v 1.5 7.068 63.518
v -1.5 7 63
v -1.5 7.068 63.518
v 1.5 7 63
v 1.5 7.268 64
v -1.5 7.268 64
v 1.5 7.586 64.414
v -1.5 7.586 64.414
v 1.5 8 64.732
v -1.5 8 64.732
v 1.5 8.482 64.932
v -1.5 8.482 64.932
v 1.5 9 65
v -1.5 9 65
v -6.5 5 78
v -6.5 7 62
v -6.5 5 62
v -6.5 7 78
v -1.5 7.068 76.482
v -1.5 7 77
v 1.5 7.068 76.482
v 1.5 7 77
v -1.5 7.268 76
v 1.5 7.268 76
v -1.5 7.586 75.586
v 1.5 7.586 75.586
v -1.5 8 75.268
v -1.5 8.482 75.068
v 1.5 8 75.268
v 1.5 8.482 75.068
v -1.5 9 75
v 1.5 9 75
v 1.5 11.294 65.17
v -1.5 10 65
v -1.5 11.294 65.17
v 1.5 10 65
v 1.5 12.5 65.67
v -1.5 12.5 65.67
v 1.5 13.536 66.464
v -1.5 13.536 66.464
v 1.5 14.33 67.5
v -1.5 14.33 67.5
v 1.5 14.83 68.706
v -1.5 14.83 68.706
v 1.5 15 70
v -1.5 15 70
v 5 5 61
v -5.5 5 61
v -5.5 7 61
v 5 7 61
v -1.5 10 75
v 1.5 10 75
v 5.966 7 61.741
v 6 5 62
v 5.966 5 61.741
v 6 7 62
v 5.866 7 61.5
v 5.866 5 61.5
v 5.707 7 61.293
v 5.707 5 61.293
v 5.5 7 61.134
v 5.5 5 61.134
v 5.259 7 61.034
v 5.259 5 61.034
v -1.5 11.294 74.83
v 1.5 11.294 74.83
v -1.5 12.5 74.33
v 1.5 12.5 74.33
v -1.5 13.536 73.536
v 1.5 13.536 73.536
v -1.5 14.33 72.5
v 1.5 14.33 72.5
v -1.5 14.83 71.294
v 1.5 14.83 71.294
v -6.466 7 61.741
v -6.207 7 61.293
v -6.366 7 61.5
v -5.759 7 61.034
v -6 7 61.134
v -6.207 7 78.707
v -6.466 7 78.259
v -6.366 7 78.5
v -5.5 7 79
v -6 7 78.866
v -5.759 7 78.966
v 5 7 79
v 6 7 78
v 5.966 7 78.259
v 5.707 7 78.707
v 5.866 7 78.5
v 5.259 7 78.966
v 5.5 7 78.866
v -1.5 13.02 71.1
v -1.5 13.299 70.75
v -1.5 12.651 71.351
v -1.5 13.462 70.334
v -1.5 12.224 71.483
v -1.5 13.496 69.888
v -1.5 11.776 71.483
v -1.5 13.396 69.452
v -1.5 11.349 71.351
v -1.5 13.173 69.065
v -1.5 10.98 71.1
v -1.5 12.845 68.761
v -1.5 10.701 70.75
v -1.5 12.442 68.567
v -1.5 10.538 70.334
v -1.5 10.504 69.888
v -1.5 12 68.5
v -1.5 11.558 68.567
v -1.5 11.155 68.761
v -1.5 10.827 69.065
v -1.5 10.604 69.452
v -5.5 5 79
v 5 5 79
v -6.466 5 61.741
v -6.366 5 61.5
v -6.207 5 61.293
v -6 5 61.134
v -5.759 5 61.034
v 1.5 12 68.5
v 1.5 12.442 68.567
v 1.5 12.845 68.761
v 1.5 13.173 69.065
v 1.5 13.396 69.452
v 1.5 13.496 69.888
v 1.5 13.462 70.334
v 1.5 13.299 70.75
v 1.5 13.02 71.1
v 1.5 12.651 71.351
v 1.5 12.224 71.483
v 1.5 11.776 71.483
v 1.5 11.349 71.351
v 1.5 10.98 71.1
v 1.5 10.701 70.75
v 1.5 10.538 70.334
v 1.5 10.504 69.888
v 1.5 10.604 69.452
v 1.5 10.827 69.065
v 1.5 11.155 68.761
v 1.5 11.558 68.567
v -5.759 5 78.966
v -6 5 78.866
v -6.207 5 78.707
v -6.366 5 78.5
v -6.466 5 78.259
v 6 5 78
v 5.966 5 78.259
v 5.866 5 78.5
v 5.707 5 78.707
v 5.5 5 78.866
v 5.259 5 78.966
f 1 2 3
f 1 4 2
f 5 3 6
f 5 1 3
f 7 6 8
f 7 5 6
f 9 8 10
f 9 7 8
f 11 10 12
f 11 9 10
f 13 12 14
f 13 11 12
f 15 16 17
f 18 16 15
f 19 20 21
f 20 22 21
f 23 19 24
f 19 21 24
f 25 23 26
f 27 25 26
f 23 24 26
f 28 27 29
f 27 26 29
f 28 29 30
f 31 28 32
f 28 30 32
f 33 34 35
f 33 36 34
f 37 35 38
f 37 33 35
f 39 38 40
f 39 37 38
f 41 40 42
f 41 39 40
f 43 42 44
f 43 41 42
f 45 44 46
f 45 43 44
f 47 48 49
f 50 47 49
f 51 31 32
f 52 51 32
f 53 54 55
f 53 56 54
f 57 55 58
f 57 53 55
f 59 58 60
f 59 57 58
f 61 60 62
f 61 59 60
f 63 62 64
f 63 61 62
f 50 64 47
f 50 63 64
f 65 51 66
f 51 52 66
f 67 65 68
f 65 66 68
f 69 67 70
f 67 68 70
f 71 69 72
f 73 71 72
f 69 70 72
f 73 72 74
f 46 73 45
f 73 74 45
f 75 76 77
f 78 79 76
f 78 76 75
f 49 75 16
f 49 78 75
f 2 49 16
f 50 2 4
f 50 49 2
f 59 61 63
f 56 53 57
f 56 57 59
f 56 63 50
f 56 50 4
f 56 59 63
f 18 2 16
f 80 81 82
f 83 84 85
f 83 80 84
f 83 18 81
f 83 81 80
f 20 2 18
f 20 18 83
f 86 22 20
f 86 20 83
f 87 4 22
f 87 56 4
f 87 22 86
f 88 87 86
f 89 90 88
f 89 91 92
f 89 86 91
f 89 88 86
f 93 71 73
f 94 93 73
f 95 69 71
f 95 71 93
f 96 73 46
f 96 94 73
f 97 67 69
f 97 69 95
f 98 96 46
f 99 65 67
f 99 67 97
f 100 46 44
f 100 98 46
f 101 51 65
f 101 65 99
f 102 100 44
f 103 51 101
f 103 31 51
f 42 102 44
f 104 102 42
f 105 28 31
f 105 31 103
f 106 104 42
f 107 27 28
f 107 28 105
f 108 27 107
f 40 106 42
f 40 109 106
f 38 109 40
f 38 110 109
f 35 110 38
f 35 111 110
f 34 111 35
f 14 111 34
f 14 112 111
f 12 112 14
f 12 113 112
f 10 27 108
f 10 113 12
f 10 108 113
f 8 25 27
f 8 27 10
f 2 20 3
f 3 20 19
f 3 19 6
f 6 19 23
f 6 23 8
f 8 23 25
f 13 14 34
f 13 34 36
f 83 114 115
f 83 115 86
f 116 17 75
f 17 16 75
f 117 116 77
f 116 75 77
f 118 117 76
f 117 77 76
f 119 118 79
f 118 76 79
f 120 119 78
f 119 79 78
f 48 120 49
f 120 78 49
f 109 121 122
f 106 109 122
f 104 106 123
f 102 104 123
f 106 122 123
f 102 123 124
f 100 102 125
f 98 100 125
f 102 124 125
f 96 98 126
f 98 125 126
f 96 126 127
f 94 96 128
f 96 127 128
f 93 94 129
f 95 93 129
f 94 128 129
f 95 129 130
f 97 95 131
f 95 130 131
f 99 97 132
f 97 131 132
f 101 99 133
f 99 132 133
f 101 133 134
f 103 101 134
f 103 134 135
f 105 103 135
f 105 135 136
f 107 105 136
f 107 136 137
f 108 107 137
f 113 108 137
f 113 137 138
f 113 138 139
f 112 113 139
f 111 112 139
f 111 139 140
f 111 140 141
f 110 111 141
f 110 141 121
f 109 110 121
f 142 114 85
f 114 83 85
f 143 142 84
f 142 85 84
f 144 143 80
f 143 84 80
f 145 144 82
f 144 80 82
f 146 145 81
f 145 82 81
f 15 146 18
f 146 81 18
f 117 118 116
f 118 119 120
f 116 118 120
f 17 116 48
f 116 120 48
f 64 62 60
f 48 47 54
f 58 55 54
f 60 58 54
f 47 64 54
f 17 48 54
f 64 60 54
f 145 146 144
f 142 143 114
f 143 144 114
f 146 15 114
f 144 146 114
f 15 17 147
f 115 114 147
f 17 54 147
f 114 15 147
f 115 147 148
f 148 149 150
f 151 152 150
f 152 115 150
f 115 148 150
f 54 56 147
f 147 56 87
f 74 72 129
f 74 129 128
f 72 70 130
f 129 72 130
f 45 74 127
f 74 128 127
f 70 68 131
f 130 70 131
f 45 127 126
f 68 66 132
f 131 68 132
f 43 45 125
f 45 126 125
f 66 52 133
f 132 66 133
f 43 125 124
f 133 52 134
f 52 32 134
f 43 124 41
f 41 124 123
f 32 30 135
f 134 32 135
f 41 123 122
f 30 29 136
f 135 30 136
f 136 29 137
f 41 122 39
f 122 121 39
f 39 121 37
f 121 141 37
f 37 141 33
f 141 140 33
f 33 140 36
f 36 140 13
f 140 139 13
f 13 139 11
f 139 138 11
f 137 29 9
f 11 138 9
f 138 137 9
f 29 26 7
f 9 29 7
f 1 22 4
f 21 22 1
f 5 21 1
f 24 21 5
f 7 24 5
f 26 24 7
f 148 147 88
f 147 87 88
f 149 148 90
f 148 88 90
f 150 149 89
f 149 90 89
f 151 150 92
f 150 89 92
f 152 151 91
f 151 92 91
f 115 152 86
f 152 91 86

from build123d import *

# Parameters (mm, degrees)
SKETCH1_W                = 70
SKETCH1_H                = 150
BOSS_EXTRUDE1_DEPTH      = 5
SKETCH2_W                = 3
SKETCH2_H                = 15
BOSS_EXTRUDE3_DEPTH      = 20
SKETCH2_5_W              = 16
SKETCH2_5_H              = 22
SKETCH2_5_W_2            = 3
SKETCH2_5_H_2            = 15
BOSS_EXTRUDE4_DEPTH      = 5
CHAMFER1_SIZE            = 3
SKETCH3_R                = 3
CUT_EXTRUDE1_DEPTH       = 89.600225733
CHAMFER3_SIZE            = 1
CHAMFER4_SIZE            = 1
CHAMFER5_SIZE            = 3
CHAMFER6_SIZE            = 3
CHAMFER7_SIZE            = 20
CHAMFER8_SIZE            = 10
SKETCH4_W                = 3
SKETCH4_H                = 10
BOSS_EXTRUDE5_DEPTH      = 10
SKETCH6_R                = 1.5
CUT_EXTRUDE2_DEPTH       = 88.076116128
FILLET1_R                = 5
CHAMFER10_SIZE           = 1
CUT_EXTRUDE3_DEPTH       = 87
BOSS_EXTRUDE6_DEPTH      = 5
BOSS_EXTRUDE6_DEPTH_BACK = 7.5
SKETCH8_W                = 18
SKETCH8_H                = 2
FILLET2_R                = 2
FILLET3_R                = 1


# Some blends are built 0.0001 mm under size
with BuildPart() as part:
    # Sketch1 → Boss-Extrude1 (new body)
    with BuildSketch(Plane(origin=(0, 0, 0), x_dir=(1, 0, 0), z_dir=(0, 1, 0))):
        Rectangle(SKETCH1_W, SKETCH1_H)
    extrude(amount=BOSS_EXTRUDE1_DEPTH)

    # Sketch2 → Boss-Extrude3 (add)
    with BuildSketch(Plane(origin=(0, 5, 0), x_dir=(1, 0, 0), z_dir=(0, 1, 0))):
        with Locations((3.5, 62.5)):
            Rectangle(SKETCH2_W, SKETCH2_H)
        with Locations((-3.5, 62.5)):
            Rectangle(SKETCH2_W, SKETCH2_H)
    extrude(amount=BOSS_EXTRUDE3_DEPTH)

    # Sketch2<5> → Boss-Extrude4 (add)
    with BuildSketch(Plane(origin=(0, 5, 0), x_dir=(1, 0, 0), z_dir=(0, 1, 0))):
        with Locations((0, 62.5)):
            Rectangle(SKETCH2_5_W, SKETCH2_5_H)
        with Locations((-3.5, 62.5)):
            Rectangle(SKETCH2_5_W_2, SKETCH2_5_H_2, mode=Mode.SUBTRACT)
        with Locations((3.5, 62.5)):
            Rectangle(SKETCH2_5_W_2, SKETCH2_5_H_2, mode=Mode.SUBTRACT)
    extrude(amount=BOSS_EXTRUDE4_DEPTH)

    # Chamfer1
    chamfer1_edges = [part.edges().sort_by_distance(p)[0] for p in [
        (0, 10, -73.5),
        (0, 10, -51.5),
    ]]
    chamfer(chamfer1_edges, length=CHAMFER1_SIZE)

    # Sketch3 → Cut-Extrude1 (cut, through all)
    with BuildSketch(Plane(origin=(5, 0, 0), x_dir=(0, 0, -1), z_dir=(1, 0, 0))):
        with Locations((62.5, 23.2)):
            Circle(SKETCH3_R)
    extrude(amount=-CUT_EXTRUDE1_DEPTH, mode=Mode.SUBTRACT)

    # Chamfer3
    # the kernel refuses this chamfer: 1, 0.714285714 mm, written as the material it takes off along each edge
    with BuildSketch(Plane(origin=(-7.571682988, 25, -64.9), x_dir=(0, -0.8672694366120031, -0.4978390546338231), z_dir=(1, 0, 0)), Plane(origin=(-0.571682988, 25, -64.9), x_dir=(0, -0.8672694366120031, -0.4978390546338231), z_dir=(1, 0, 0))) as chamfer3_piece_1:
        with BuildLine():
            Line((0.73254251, 0), (CHAMFER3_SIZE * 0.497839054634, CHAMFER3_SIZE * 0.867269436612))
            Line((CHAMFER3_SIZE * 0.497839054634, CHAMFER3_SIZE * 0.867269436612), (0, 0))
            ThreePointArc((0, 0), (0.371569513, 0.022438375), (0.73254251, 0))
        make_face()
    extrude(amount=8.143365976, mode=Mode.SUBTRACT)
    with BuildSketch(Plane(origin=(-7.571682988, 25, -60.1), x_dir=(0, 0, 1), z_dir=(1, 0, 0)), Plane(origin=(-0.571682988, 25, -60.1), x_dir=(0, 0, 1), z_dir=(1, 0, 0))) as chamfer3_piece_2:
        with BuildLine():
            Line((CHAMFER3_SIZE, 0), (0.36468827, 0.63531173))
            ThreePointArc((0.36468827, 0.63531173), (0.204441932, 0.311080183), (0, 0))
            Line((0, 0), (CHAMFER3_SIZE, 0))
        make_face()
    extrude(amount=8.143365976, mode=Mode.SUBTRACT)

    # Chamfer4
    chamfer4_edges = [part.edges().sort_by_distance(p)[0] for p in [
        (3.5, 25, -70),
        (3.5, 25, -55),
        (-3.5, 25, -70),
        (-3.5, 25, -55),
    ]]
    chamfer(chamfer4_edges, length=CHAMFER4_SIZE)

    # Chamfer5
    # the kernel refuses this chamfer: 3 mm, written as the material it adds along each edge
    with BuildSketch(Plane(origin=(-8, 5, -73.5), x_dir=(0, 1, 0), z_dir=(0, 0, 1))) as chamfer5_piece_1_section:
        Polygon((CHAMFER5_SIZE, 0), (0, CHAMFER5_SIZE), (0, 0), align=None)
    chamfer5_piece_1 = extrude(amount=22, mode=Mode.PRIVATE)
    chamfer5_piece_1 = split(chamfer5_piece_1, bisect_by=Plane(origin=(-8, 17, -61.5), z_dir=(0, -0.7071067811865476, -0.7071067811865476)), keep=Keep.TOP, mode=Mode.PRIVATE)
    chamfer5_piece_1 = split(chamfer5_piece_1, bisect_by=Plane(origin=(-8, 6, -74.5), z_dir=(0, -0.7071067811865476, 0.7071067811865476)), keep=Keep.TOP, mode=Mode.PRIVATE)
    add(chamfer5_piece_1)
    with BuildSketch(Plane(origin=(8, 5, -51.5), x_dir=(0, 1, 0), z_dir=(0, 0, -1))) as chamfer5_piece_2_section:
        Polygon((CHAMFER5_SIZE, 0), (0, CHAMFER5_SIZE), (0, 0), align=None)
    chamfer5_piece_2 = extrude(amount=22, mode=Mode.PRIVATE)
    chamfer5_piece_2 = split(chamfer5_piece_2, bisect_by=Plane(origin=(8, 6, -50.5), z_dir=(0, -0.7071067811865476, -0.7071067811865476)), keep=Keep.TOP, mode=Mode.PRIVATE)
    chamfer5_piece_2 = split(chamfer5_piece_2, bisect_by=Plane(origin=(8, 17, -63.5), z_dir=(0, -0.7071067811865476, 0.7071067811865476)), keep=Keep.TOP, mode=Mode.PRIVATE)
    add(chamfer5_piece_2)

    # Chamfer6
    chamfer6_edges = [part.edges().sort_by_distance(p)[0] for p in [
        (-5, 10, -62.5),
        (5, 10, -62.5),
    ]]
    chamfer(chamfer6_edges, length=CHAMFER6_SIZE - 0.0001)  # a hair under: the kernel refuses the full size

    # Chamfer7
    chamfer7_edges = [part.edges().sort_by_distance(p)[0] for p in [
        (35, 2.5, 75),
        (-35, 2.5, 75),
    ]]
    chamfer(chamfer7_edges, length=CHAMFER7_SIZE)

    # Chamfer8
    chamfer8_edges = [part.edges().sort_by_distance(p)[0] for p in [
        (-35, 2.5, -75),
        (35, 2.5, -75),
    ]]
    chamfer(chamfer8_edges, length=CHAMFER8_SIZE)

    # Sketch4 → Boss-Extrude5 (add)
    with BuildSketch(Plane(origin=(0, 5, 0), x_dir=(1, 0, 0), z_dir=(0, 1, 0))):
        with Locations((0, -70)):
            Rectangle(SKETCH4_W, SKETCH4_H)
    extrude(amount=BOSS_EXTRUDE5_DEPTH)

    # Sketch6 → Cut-Extrude2 (cut, through all)
    with BuildSketch(Plane(origin=(1.5, 0, 0), x_dir=(0, 0, -1), z_dir=(1, 0, 0))):
        with Locations((-70, 12)):
            Circle(SKETCH6_R)
    extrude(amount=-CUT_EXTRUDE2_DEPTH, mode=Mode.SUBTRACT)

    # Fillet1
    fillet1_edges = [part.edges().sort_by_distance(p)[0] for p in [
        (0, 15, 75),
        (0, 15, 65),
    ]]
    fillet(fillet1_edges, radius=FILLET1_R - 0.0001)  # a hair under: the kernel refuses the full size

    # Chamfer10
    chamfer10_edges = [part.edges().sort_by_distance(p)[0] for p in [
        (0, 0, 75),
        (35, 0, -5),
        (25, 0, 65),
        (-25, 0, 65),
        (-35, 0, -5),
        (0, 0, -75),
        (30, 0, -70),
        (-30, 0, -70),
    ]]
    chamfer(chamfer10_edges, length=CHAMFER10_SIZE)

    # Sketch7 → Cut-Extrude3 (cut)
    with BuildSketch(Plane.ZY.offset(35)):
        Polygon((-104.766483953, 57.568464944), (-5.977667253, 57.568464944), (-5.977667253, 5), (81.485043075, 5), (81.485043075, -30.208859449), (-5.977667253, -30.208859449), (-5.977667253, -7.084725604), (-104.766483953, -7.084725604), align=None)
    extrude(amount=-CUT_EXTRUDE3_DEPTH, mode=Mode.SUBTRACT)

    # Sketch8 → Boss-Extrude6 (add, two sides: drawn at the far end of the back side and taken through both)
    with BuildSketch(Plane.ZY.offset(1.5).offset(-BOSS_EXTRUDE6_DEPTH_BACK)):
        with Locations((70, 6)):
            Rectangle(SKETCH8_W, SKETCH8_H)
    extrude(amount=BOSS_EXTRUDE6_DEPTH + BOSS_EXTRUDE6_DEPTH_BACK)

    # Fillet2
    fillet2_edges = [part.edges().sort_by_distance(p)[0] for p in [
        (0, 7, 75),
        (0, 7, 65),
    ]]
    fillet(fillet2_edges, radius=FILLET2_R)

    # Fillet3
    fillet3_edges = [part.edges().sort_by_distance(p)[0] for p in [
        (6, 6, 61),
        (6, 6, 79),
        (-6.5, 6, 61),
        (-6.5, 6, 79),
    ]]
    fillet(fillet3_edges, radius=FILLET3_R)


solid = part.part
